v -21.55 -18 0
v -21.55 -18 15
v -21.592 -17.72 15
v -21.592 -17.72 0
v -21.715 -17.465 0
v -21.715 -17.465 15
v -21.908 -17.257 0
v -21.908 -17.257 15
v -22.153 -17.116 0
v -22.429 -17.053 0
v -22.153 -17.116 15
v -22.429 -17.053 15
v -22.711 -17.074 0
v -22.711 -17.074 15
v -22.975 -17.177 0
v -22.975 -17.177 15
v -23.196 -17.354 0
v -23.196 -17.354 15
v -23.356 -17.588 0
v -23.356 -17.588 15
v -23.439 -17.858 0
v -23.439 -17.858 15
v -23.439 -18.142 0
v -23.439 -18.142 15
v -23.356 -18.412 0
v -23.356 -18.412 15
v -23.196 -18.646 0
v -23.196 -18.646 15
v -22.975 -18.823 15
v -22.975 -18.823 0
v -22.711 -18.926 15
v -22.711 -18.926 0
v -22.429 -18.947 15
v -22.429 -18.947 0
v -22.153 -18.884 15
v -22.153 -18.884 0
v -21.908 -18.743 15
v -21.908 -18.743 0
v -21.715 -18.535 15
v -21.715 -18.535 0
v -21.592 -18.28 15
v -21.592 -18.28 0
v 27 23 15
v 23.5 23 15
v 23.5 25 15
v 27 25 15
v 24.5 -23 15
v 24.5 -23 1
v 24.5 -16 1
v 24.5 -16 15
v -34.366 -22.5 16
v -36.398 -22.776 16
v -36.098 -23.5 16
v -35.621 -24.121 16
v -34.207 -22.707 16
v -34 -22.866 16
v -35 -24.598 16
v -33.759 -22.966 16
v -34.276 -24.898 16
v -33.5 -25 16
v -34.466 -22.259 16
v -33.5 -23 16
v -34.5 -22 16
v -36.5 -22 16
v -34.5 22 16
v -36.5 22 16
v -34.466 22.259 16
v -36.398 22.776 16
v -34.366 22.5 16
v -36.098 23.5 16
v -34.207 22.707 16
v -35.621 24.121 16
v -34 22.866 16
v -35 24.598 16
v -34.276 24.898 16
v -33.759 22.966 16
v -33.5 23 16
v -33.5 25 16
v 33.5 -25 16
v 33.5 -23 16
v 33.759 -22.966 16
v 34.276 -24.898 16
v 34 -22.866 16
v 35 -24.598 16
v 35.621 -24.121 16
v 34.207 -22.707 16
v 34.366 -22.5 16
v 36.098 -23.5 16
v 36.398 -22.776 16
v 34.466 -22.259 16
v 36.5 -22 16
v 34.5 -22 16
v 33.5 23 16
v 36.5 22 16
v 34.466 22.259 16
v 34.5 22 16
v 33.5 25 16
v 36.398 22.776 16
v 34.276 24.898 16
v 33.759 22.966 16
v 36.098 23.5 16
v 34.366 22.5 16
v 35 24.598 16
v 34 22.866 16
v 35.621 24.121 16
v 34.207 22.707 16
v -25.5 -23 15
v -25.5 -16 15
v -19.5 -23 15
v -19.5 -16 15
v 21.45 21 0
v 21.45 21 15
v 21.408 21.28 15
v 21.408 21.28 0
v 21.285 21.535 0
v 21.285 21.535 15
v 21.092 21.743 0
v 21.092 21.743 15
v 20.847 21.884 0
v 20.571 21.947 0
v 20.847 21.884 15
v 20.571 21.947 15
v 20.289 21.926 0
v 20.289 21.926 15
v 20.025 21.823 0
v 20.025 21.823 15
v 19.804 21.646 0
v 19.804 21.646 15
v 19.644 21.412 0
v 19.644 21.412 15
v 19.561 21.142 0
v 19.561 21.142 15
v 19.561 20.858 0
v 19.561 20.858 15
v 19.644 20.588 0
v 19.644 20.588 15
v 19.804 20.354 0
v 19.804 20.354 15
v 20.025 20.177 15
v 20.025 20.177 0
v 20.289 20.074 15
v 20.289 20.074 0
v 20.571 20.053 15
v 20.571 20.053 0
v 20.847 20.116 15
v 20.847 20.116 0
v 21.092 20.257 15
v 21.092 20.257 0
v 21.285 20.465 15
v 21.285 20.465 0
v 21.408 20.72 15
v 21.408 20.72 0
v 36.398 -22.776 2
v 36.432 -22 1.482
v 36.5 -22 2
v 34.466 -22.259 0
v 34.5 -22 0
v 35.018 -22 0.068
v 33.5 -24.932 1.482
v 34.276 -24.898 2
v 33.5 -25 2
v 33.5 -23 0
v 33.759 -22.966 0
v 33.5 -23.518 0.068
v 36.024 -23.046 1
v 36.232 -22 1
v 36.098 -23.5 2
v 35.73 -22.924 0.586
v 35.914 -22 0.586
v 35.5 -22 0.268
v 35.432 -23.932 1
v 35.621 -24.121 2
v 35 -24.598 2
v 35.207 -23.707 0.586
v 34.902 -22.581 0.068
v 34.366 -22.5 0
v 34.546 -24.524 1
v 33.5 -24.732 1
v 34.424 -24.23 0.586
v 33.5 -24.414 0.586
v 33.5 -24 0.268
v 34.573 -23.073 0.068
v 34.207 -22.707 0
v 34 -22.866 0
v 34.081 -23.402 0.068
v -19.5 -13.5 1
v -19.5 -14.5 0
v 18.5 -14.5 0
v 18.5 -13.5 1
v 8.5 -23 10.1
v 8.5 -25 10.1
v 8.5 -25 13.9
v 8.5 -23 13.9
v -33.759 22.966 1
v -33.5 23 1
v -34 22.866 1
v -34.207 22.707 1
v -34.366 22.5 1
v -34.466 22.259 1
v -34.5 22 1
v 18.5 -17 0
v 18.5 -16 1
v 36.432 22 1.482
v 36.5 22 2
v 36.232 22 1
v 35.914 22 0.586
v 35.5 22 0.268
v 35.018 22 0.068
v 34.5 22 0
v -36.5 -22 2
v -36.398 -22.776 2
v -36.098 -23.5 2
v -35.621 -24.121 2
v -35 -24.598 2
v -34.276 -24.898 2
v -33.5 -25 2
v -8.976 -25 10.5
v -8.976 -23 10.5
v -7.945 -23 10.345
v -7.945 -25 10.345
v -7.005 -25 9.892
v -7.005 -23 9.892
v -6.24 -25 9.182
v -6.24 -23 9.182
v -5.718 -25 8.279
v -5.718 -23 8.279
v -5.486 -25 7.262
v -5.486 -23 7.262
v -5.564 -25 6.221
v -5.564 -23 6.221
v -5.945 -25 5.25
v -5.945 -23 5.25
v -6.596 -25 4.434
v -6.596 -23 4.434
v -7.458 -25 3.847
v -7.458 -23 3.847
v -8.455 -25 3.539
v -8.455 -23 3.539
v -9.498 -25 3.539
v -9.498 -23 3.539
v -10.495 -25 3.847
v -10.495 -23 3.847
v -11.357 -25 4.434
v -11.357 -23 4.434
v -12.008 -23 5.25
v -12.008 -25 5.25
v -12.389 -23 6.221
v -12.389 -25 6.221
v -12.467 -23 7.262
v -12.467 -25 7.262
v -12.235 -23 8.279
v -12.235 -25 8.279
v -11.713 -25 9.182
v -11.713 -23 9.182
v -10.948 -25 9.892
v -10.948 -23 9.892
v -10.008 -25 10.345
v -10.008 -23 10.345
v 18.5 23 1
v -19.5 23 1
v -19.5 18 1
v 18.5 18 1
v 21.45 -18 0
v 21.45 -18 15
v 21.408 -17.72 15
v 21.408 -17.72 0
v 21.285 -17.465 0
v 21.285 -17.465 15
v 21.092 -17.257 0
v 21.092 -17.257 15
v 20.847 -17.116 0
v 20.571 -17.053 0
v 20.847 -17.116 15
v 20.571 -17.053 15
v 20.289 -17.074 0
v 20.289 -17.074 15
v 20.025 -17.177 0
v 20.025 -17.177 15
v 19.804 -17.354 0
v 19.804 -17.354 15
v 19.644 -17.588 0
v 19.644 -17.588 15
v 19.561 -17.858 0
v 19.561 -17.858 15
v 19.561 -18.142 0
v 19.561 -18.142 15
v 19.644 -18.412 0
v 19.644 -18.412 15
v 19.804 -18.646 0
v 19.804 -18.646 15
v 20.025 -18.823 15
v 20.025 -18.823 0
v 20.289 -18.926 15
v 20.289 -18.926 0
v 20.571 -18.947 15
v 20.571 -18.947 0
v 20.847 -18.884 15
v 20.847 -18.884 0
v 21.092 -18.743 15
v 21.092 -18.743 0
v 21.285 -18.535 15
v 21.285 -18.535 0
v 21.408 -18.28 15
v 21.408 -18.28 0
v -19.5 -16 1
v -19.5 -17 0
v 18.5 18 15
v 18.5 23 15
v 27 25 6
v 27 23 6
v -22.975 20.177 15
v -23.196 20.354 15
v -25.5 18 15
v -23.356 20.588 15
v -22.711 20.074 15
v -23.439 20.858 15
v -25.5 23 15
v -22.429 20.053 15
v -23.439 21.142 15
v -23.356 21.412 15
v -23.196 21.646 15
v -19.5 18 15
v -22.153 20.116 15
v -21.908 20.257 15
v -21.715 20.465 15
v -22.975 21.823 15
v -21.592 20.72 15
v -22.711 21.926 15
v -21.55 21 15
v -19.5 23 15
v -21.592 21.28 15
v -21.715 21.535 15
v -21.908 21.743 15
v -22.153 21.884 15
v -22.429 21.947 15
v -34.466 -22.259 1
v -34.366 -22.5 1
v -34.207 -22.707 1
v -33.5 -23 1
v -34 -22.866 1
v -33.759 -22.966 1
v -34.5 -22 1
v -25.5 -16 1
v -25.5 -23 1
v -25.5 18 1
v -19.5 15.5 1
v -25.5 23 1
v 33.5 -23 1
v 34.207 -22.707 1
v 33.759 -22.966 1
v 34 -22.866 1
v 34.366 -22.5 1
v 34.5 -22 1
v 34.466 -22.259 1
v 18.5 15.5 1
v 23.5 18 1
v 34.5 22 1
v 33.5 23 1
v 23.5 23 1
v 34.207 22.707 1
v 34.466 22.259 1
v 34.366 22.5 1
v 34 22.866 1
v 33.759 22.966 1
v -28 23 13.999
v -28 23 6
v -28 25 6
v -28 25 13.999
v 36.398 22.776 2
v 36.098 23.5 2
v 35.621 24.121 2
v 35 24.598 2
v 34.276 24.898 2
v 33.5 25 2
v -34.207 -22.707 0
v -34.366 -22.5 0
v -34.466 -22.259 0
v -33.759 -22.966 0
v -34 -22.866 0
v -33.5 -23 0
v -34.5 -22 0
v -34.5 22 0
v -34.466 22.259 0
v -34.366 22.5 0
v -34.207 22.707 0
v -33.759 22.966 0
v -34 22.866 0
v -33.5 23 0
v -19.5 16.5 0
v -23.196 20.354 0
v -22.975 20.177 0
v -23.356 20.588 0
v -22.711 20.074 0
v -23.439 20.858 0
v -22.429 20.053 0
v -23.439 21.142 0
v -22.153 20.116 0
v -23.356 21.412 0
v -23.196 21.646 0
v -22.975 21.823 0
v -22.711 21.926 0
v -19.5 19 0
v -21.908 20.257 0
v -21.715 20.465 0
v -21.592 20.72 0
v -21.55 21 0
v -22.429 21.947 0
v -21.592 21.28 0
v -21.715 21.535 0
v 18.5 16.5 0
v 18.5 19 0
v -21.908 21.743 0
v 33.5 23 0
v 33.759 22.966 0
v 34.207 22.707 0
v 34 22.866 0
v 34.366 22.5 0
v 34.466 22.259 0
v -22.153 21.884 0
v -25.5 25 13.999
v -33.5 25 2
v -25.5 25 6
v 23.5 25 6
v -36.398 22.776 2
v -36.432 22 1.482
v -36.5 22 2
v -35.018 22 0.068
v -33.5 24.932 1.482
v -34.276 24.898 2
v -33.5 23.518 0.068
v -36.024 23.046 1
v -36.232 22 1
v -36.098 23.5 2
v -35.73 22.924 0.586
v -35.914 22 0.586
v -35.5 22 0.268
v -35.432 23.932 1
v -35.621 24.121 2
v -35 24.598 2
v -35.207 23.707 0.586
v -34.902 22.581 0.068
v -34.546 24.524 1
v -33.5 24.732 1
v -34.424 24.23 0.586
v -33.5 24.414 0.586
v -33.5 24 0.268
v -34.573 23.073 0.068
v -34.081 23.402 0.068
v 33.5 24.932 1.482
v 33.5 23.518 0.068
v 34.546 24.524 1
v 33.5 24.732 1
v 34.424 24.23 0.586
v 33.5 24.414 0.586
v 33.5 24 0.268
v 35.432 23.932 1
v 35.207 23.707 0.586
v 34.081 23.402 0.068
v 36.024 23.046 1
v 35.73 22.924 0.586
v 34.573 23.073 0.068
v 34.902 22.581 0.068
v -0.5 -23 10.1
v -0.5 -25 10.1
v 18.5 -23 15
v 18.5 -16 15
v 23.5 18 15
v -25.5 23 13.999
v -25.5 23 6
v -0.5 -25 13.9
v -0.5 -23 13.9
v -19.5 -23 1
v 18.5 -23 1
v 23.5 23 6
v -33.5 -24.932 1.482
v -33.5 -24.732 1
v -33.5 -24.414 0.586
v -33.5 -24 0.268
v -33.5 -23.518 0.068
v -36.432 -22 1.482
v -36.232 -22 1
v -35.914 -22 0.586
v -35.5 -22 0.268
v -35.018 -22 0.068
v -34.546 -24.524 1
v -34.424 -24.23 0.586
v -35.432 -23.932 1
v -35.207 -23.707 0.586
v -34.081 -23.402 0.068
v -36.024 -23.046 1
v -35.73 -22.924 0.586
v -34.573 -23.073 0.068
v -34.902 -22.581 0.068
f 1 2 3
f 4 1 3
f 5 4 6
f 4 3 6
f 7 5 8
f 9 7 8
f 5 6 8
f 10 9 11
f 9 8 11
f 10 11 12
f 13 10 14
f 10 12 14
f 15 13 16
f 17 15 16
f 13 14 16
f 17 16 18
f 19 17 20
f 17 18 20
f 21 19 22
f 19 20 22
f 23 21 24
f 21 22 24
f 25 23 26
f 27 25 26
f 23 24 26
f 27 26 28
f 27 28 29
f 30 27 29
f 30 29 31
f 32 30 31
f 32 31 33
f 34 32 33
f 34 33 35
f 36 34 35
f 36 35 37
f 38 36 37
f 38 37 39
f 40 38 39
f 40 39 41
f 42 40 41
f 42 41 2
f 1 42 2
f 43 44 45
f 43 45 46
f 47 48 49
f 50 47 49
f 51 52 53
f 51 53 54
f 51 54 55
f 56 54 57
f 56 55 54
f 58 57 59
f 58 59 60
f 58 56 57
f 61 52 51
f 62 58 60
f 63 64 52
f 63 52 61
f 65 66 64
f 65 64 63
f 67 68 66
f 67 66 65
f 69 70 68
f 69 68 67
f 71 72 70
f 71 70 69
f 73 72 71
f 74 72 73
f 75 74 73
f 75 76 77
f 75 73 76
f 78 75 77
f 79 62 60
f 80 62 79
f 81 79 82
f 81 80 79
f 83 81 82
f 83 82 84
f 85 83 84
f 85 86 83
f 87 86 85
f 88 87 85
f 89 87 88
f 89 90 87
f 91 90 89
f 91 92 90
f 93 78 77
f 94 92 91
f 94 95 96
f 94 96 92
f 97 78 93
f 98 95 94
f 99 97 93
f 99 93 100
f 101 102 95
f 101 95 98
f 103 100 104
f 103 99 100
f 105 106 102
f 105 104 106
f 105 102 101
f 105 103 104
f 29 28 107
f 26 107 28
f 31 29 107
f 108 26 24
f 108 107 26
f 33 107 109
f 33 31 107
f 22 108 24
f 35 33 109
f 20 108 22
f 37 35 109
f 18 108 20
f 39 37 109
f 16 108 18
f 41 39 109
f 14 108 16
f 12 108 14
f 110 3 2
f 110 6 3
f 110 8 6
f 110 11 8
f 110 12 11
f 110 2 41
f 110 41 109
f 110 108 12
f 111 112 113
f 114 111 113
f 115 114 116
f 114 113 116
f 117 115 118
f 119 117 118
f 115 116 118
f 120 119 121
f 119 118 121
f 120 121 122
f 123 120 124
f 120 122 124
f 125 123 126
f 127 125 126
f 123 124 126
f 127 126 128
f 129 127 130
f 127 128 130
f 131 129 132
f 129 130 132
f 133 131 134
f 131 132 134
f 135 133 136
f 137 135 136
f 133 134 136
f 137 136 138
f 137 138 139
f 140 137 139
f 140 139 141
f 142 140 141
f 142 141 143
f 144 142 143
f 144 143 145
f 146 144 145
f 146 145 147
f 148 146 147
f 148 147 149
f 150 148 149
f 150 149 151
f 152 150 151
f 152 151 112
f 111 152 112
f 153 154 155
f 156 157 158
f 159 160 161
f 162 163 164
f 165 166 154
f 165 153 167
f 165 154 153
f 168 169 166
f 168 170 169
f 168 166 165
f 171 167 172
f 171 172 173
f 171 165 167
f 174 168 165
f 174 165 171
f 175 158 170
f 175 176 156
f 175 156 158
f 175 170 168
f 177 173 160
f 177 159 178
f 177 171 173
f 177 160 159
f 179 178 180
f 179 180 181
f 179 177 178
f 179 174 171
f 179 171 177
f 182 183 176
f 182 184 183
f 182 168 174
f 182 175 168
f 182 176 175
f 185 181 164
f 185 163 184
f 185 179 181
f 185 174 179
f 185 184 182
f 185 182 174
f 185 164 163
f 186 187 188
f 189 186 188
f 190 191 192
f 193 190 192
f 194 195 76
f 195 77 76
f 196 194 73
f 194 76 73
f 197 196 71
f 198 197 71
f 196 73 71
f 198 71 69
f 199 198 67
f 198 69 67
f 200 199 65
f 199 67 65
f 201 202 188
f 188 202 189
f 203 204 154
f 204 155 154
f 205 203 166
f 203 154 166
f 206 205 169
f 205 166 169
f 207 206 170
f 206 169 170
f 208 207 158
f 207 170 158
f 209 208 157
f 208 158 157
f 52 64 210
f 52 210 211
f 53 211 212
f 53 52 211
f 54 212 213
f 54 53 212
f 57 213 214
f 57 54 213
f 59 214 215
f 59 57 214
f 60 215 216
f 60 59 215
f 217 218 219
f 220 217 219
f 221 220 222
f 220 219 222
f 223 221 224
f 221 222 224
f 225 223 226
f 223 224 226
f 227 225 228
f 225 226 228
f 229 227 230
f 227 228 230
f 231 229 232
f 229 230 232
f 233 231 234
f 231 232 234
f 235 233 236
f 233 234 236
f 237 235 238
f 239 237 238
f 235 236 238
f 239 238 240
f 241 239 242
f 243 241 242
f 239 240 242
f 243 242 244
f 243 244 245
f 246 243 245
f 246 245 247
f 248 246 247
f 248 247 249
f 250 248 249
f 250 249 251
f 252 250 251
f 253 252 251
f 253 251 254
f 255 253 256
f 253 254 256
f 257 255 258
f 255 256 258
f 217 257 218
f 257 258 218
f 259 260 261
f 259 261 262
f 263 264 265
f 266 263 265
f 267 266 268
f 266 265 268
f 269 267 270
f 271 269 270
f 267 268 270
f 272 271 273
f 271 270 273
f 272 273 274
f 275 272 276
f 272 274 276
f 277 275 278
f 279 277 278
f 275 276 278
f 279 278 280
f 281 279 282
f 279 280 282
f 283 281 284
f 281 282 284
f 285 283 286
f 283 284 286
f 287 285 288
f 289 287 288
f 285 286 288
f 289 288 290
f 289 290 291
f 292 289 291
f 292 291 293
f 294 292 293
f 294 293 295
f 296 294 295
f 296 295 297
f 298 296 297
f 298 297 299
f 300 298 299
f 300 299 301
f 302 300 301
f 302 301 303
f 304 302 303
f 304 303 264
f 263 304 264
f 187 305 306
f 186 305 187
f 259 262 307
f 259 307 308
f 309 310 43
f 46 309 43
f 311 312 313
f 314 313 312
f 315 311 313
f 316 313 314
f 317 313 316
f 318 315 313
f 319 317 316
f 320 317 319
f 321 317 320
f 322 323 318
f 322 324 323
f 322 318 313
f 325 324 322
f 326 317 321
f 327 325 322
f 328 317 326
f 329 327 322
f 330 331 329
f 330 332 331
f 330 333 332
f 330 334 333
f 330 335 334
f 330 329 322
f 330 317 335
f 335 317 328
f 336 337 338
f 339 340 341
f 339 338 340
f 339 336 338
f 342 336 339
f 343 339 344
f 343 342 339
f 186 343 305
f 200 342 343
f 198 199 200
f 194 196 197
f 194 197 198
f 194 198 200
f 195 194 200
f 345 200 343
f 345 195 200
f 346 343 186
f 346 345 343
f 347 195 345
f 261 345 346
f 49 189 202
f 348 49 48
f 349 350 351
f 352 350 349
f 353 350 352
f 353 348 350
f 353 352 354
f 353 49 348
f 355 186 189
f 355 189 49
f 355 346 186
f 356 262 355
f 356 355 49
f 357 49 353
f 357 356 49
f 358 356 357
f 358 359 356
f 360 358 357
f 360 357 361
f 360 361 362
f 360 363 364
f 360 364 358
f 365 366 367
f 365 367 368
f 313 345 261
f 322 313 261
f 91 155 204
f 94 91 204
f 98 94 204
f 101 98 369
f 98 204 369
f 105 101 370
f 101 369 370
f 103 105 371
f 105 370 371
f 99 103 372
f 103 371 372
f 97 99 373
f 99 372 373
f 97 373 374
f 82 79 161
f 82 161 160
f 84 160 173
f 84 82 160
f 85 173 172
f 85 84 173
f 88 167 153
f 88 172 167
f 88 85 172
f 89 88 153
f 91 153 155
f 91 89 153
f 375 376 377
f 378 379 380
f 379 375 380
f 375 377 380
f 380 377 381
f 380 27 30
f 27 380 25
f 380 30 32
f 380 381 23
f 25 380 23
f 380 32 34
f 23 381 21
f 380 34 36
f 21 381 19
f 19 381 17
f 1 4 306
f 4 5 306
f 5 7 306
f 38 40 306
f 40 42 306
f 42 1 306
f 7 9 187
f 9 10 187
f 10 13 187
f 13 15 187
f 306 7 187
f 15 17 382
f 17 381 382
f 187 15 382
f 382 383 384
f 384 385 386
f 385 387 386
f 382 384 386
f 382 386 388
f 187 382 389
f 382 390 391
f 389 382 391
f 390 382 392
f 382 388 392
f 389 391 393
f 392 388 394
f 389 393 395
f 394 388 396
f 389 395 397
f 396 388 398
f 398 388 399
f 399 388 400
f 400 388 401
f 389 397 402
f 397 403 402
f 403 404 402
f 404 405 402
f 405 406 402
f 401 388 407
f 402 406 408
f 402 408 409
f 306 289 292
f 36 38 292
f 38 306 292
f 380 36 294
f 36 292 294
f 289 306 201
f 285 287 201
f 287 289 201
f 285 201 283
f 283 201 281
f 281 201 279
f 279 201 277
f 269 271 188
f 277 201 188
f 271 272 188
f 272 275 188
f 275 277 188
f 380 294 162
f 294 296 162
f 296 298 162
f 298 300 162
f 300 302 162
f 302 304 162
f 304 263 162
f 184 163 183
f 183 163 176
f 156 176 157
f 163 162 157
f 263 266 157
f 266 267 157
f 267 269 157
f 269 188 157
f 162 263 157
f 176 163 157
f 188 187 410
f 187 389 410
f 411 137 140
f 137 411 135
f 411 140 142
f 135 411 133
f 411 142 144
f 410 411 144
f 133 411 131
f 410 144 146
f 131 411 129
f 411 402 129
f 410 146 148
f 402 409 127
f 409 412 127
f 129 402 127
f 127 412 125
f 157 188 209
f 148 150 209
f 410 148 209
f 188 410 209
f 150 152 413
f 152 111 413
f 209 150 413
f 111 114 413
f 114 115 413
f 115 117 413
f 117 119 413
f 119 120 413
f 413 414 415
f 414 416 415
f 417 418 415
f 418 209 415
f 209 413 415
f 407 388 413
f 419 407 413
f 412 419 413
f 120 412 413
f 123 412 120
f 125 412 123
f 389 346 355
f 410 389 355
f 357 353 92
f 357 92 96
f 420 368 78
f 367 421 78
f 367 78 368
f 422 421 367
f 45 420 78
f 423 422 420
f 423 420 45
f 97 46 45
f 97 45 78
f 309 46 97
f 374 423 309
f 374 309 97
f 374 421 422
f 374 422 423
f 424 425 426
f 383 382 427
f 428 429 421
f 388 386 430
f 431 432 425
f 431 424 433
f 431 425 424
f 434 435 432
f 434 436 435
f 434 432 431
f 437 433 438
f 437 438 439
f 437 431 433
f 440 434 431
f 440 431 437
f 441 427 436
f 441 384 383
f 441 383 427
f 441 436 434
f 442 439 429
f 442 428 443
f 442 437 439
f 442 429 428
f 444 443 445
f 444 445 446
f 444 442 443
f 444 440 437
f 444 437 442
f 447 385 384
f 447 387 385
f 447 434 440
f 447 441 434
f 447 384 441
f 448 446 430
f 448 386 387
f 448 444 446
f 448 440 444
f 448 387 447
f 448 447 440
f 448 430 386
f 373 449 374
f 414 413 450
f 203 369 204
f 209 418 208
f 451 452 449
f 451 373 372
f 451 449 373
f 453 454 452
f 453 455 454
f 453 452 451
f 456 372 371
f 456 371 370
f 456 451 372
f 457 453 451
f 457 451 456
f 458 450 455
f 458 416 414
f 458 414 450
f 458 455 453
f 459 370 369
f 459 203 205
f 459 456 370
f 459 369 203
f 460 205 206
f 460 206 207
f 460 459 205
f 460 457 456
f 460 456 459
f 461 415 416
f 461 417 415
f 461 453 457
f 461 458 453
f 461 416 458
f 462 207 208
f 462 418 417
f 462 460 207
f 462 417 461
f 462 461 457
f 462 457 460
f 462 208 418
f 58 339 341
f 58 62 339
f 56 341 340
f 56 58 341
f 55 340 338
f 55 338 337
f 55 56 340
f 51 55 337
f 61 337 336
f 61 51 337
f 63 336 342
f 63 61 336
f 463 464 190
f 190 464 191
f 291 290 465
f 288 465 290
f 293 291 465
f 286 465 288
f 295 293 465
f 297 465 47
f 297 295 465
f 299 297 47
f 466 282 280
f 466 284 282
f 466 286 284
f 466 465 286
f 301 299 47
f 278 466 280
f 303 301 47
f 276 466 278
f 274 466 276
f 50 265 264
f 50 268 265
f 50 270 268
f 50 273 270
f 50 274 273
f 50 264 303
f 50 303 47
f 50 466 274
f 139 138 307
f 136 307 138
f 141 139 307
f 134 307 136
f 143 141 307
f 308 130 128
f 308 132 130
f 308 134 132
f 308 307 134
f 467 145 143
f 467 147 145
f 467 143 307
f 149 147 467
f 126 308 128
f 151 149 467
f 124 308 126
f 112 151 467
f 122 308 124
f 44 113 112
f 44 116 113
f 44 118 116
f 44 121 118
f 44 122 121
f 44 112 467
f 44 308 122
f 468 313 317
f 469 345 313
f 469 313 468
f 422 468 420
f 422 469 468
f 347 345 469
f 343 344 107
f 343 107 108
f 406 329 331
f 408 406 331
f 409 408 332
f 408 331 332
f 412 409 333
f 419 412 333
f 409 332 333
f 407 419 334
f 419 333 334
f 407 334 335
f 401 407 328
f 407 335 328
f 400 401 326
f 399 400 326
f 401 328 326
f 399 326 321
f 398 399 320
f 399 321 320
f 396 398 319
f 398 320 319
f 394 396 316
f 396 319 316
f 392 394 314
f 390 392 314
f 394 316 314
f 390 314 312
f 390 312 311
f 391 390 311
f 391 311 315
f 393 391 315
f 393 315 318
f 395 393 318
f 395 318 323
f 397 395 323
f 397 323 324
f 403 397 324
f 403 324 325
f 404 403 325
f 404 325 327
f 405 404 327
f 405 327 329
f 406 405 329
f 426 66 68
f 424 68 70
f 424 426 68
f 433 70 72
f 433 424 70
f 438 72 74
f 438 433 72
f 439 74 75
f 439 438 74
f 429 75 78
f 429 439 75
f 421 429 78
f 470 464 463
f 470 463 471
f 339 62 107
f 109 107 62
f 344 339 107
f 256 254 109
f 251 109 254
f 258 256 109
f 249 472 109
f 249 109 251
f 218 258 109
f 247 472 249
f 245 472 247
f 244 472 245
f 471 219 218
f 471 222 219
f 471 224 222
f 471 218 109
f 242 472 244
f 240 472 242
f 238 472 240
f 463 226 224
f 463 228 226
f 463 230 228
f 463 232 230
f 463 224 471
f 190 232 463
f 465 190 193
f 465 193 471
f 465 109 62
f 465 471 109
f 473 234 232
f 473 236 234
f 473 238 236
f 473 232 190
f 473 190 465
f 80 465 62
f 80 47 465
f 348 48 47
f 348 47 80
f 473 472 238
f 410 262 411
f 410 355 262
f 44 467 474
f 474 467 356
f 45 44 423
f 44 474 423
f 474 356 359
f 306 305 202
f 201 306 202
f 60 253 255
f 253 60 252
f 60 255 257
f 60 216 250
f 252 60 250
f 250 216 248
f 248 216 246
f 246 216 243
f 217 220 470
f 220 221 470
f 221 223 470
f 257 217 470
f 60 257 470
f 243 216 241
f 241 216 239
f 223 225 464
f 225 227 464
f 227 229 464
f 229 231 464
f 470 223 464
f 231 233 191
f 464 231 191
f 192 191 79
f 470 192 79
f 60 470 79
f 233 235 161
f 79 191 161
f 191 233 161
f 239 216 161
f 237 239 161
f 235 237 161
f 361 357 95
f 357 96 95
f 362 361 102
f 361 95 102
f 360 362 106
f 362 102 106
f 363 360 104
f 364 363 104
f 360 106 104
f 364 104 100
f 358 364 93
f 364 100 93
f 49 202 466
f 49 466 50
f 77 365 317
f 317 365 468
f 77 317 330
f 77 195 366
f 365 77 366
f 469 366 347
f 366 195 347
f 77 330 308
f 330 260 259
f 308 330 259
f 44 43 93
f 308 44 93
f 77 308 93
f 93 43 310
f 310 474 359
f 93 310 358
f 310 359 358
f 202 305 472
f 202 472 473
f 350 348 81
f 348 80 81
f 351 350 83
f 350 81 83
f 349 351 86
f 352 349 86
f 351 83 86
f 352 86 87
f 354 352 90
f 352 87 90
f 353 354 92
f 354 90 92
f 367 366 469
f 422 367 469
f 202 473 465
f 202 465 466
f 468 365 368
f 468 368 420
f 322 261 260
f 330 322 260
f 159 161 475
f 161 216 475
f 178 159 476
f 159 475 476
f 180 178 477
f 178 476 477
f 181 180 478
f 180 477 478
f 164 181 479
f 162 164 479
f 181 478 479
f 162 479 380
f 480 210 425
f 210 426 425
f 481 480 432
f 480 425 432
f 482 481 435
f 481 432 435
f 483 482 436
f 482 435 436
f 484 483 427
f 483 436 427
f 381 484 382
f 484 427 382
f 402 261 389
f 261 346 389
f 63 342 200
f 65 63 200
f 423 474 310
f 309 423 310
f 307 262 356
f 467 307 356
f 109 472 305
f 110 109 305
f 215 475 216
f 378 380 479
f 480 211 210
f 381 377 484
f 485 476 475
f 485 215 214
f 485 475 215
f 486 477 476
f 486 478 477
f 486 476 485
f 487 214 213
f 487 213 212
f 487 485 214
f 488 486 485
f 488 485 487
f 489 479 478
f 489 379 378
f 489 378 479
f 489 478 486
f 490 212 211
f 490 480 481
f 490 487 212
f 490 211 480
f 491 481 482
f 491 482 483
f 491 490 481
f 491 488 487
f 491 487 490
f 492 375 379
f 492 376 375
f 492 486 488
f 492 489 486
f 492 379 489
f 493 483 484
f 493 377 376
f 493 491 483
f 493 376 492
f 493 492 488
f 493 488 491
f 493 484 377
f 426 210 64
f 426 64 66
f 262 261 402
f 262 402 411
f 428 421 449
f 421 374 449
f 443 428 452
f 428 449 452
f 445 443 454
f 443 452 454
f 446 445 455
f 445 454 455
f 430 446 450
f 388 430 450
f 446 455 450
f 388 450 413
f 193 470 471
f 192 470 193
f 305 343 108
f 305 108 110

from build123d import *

# Parameters (mm, degrees)
SKETCH1_W           = 73
SKETCH1_H           = 50
BOSS_EXTRUDE1_DEPTH = 1
SKETCH2_W           = 73
SKETCH2_H           = 50
SKETCH2_W_2         = 69
SKETCH2_H_2         = 46
BOSS_EXTRUDE2_DEPTH = 15
FILLET1_R           = 3
FILLET2_R           = 1
SKETCH3_W           = 9
SKETCH3_H           = 3.8
CUT_EXTRUDE1_DEPTH  = 2
SKETCH5_R           = 3.5
CUT_EXTRUDE2_DEPTH  = 2
SKETCH6_W           = 6
SKETCH6_H           = 5
SKETCH6_W_2         = 5
BOSS_EXTRUDE3_DEPTH = 14
SKETCH7_W           = 6
SKETCH7_H           = 7
BOSS_EXTRUDE4_DEPTH = 14
FILLET3_R           = 2
SKETCH8_W           = 2.5
SKETCH8_H           = 7.999199493
SKETCH8_W_2         = 3.5
SKETCH8_H_2         = 9
CUT_EXTRUDE3_DEPTH  = 63.387899545
SKETCH9_R           = 0.95
CUT_EXTRUDE4_DEPTH  = 47.714558812
SKETCH10_W          = 38
SKETCH10_H          = 1.5
CUT_EXTRUDE5_DEPTH  = 47.714558812
CHAMFER1_SIZE       = 1
CHAMFER2_SIZE       = 1


with BuildPart() as part:
    # Sketch1 → Boss-Extrude1 (new body)
    with BuildSketch(Plane.XY):
        Rectangle(SKETCH1_W, SKETCH1_H)
    extrude(amount=BOSS_EXTRUDE1_DEPTH)

    # Sketch2 → Boss-Extrude2 (add)
    with BuildSketch(Plane.XY.offset(1)):
        Rectangle(SKETCH2_W, SKETCH2_H)
        Rectangle(SKETCH2_W_2, SKETCH2_H_2, mode=Mode.SUBTRACT)
    extrude(amount=BOSS_EXTRUDE2_DEPTH)

    # Fillet1
    fillet1_edges = [part.edges().sort_by_distance(p)[0] for p in [
        (36.5, -25, 8),
        (-36.5, -25, 8),
        (-36.5, 25, 8),
        (36.5, 25, 8),
    ]]
    fillet(fillet1_edges, radius=FILLET1_R)

    # Fillet2
    fillet2_edges = [part.edges().sort_by_distance(p)[0] for p in [
        (34.5, 23, 8.5),
        (-34.5, 23, 8.5),
        (-34.5, -23, 8.5),
        (34.5, -23, 8.5),
    ]]
    fillet(fillet2_edges, radius=FILLET2_R)

    # Sketch3 → Cut-Extrude1 (cut)
    with BuildSketch(Plane.XZ.offset(25)):
        with Locations((4, 12)):
            Rectangle(SKETCH3_W, SKETCH3_H)
    extrude(amount=-CUT_EXTRUDE1_DEPTH, mode=Mode.SUBTRACT)

    # Sketch5 → Cut-Extrude2 (cut)
    with BuildSketch(Plane(origin=(0, -23, 0), x_dir=(1, 0, 0), z_dir=(0, 1, 0))):
        with Locations(Location((-8.976447348, -7, 0), (0, 0, 270))):
            Circle(SKETCH5_R)
    extrude(amount=-CUT_EXTRUDE2_DEPTH, mode=Mode.SUBTRACT)

    # Sketch6 → Boss-Extrude3 (add)
    with BuildSketch(Plane.XY.offset(1)):
        with Locations((-22.5, 20.5)):
            Rectangle(SKETCH6_W, SKETCH6_H)
        with Locations((21, 20.5)):
            Rectangle(SKETCH6_W_2, SKETCH6_H)
    extrude(amount=BOSS_EXTRUDE3_DEPTH)

    # Sketch7 → Boss-Extrude4 (add)
    with BuildSketch(Plane.XY.offset(1)):
        with Locations((21.5, -19.5)):
            Rectangle(SKETCH7_W, SKETCH7_H)
        with Locations((-22.5, -19.5)):
            Rectangle(SKETCH7_W, SKETCH7_H)
    extrude(amount=BOSS_EXTRUDE4_DEPTH)

    # Fillet3
    fillet3_edges = [part.edges().sort_by_distance(p)[0] for p in [
        (-36.5, 0, 0),
        (36.5, 0, 0),
        (0, -25, 0),
        (0, 25, 0),
        (35.621320344, -24.121320344, 0),
        (35.621320344, 24.121320344, 0),
        (-35.621320344, -24.121320344, 0),
        (-35.621320344, 24.121320344, 0),
    ]]
    fillet(fillet3_edges, radius=FILLET3_R)

    # Sketch8 → Cut-Extrude3 (cut, through all)
    with BuildSketch(Plane.XZ.offset(-23)):
        with Locations((-26.75, 9.999599746)):
            Rectangle(SKETCH8_W, SKETCH8_H)
        with Locations((25.25, 10.5)):
            Rectangle(SKETCH8_W_2, SKETCH8_H_2)
    extrude(amount=-CUT_EXTRUDE3_DEPTH, mode=Mode.SUBTRACT)

    # Sketch9 → Cut-Extrude4 (cut, through all)
    with BuildSketch(Plane.XY.offset(15)):
        with Locations((-22.5, 21)):
            Circle(SKETCH9_R)
        with Locations((20.5, 21)):
            Circle(SKETCH9_R)
        with Locations((20.5, -18)):
            Circle(SKETCH9_R)
        with Locations((-22.5, -18)):
            Circle(SKETCH9_R)
    extrude(amount=-CUT_EXTRUDE4_DEPTH, mode=Mode.SUBTRACT)

    # Sketch10 → Cut-Extrude5 (cut, through all)
    with BuildSketch(Plane.XY.offset(1)):
        with Locations((-0.5, 17.25)):
            Rectangle(SKETCH10_W, SKETCH10_H)
        with Locations((-0.5, -15.25)):
            Rectangle(SKETCH10_W, SKETCH10_H)
    extrude(amount=-CUT_EXTRUDE5_DEPTH, mode=Mode.SUBTRACT)

    # Chamfer1
    chamfer1_edges = [part.edges().sort_by_distance(p)[0] for p in [
        (-0.5, -16, 0),
        (-0.5, 18, 0),
    ]]
    chamfer(chamfer1_edges, length=CHAMFER1_SIZE - 0.0001)  # a hair under: the kernel refuses the full size

    # Chamfer2
    chamfer2_edges = [part.edges().sort_by_distance(p)[0] for p in [
        (-0.5, 16.5, 1),
        (-0.5, -14.5, 1),
    ]]
    chamfer(chamfer2_edges, length=CHAMFER2_SIZE - 0.0001)  # a hair under: the kernel refuses the full size


solid = part.part
